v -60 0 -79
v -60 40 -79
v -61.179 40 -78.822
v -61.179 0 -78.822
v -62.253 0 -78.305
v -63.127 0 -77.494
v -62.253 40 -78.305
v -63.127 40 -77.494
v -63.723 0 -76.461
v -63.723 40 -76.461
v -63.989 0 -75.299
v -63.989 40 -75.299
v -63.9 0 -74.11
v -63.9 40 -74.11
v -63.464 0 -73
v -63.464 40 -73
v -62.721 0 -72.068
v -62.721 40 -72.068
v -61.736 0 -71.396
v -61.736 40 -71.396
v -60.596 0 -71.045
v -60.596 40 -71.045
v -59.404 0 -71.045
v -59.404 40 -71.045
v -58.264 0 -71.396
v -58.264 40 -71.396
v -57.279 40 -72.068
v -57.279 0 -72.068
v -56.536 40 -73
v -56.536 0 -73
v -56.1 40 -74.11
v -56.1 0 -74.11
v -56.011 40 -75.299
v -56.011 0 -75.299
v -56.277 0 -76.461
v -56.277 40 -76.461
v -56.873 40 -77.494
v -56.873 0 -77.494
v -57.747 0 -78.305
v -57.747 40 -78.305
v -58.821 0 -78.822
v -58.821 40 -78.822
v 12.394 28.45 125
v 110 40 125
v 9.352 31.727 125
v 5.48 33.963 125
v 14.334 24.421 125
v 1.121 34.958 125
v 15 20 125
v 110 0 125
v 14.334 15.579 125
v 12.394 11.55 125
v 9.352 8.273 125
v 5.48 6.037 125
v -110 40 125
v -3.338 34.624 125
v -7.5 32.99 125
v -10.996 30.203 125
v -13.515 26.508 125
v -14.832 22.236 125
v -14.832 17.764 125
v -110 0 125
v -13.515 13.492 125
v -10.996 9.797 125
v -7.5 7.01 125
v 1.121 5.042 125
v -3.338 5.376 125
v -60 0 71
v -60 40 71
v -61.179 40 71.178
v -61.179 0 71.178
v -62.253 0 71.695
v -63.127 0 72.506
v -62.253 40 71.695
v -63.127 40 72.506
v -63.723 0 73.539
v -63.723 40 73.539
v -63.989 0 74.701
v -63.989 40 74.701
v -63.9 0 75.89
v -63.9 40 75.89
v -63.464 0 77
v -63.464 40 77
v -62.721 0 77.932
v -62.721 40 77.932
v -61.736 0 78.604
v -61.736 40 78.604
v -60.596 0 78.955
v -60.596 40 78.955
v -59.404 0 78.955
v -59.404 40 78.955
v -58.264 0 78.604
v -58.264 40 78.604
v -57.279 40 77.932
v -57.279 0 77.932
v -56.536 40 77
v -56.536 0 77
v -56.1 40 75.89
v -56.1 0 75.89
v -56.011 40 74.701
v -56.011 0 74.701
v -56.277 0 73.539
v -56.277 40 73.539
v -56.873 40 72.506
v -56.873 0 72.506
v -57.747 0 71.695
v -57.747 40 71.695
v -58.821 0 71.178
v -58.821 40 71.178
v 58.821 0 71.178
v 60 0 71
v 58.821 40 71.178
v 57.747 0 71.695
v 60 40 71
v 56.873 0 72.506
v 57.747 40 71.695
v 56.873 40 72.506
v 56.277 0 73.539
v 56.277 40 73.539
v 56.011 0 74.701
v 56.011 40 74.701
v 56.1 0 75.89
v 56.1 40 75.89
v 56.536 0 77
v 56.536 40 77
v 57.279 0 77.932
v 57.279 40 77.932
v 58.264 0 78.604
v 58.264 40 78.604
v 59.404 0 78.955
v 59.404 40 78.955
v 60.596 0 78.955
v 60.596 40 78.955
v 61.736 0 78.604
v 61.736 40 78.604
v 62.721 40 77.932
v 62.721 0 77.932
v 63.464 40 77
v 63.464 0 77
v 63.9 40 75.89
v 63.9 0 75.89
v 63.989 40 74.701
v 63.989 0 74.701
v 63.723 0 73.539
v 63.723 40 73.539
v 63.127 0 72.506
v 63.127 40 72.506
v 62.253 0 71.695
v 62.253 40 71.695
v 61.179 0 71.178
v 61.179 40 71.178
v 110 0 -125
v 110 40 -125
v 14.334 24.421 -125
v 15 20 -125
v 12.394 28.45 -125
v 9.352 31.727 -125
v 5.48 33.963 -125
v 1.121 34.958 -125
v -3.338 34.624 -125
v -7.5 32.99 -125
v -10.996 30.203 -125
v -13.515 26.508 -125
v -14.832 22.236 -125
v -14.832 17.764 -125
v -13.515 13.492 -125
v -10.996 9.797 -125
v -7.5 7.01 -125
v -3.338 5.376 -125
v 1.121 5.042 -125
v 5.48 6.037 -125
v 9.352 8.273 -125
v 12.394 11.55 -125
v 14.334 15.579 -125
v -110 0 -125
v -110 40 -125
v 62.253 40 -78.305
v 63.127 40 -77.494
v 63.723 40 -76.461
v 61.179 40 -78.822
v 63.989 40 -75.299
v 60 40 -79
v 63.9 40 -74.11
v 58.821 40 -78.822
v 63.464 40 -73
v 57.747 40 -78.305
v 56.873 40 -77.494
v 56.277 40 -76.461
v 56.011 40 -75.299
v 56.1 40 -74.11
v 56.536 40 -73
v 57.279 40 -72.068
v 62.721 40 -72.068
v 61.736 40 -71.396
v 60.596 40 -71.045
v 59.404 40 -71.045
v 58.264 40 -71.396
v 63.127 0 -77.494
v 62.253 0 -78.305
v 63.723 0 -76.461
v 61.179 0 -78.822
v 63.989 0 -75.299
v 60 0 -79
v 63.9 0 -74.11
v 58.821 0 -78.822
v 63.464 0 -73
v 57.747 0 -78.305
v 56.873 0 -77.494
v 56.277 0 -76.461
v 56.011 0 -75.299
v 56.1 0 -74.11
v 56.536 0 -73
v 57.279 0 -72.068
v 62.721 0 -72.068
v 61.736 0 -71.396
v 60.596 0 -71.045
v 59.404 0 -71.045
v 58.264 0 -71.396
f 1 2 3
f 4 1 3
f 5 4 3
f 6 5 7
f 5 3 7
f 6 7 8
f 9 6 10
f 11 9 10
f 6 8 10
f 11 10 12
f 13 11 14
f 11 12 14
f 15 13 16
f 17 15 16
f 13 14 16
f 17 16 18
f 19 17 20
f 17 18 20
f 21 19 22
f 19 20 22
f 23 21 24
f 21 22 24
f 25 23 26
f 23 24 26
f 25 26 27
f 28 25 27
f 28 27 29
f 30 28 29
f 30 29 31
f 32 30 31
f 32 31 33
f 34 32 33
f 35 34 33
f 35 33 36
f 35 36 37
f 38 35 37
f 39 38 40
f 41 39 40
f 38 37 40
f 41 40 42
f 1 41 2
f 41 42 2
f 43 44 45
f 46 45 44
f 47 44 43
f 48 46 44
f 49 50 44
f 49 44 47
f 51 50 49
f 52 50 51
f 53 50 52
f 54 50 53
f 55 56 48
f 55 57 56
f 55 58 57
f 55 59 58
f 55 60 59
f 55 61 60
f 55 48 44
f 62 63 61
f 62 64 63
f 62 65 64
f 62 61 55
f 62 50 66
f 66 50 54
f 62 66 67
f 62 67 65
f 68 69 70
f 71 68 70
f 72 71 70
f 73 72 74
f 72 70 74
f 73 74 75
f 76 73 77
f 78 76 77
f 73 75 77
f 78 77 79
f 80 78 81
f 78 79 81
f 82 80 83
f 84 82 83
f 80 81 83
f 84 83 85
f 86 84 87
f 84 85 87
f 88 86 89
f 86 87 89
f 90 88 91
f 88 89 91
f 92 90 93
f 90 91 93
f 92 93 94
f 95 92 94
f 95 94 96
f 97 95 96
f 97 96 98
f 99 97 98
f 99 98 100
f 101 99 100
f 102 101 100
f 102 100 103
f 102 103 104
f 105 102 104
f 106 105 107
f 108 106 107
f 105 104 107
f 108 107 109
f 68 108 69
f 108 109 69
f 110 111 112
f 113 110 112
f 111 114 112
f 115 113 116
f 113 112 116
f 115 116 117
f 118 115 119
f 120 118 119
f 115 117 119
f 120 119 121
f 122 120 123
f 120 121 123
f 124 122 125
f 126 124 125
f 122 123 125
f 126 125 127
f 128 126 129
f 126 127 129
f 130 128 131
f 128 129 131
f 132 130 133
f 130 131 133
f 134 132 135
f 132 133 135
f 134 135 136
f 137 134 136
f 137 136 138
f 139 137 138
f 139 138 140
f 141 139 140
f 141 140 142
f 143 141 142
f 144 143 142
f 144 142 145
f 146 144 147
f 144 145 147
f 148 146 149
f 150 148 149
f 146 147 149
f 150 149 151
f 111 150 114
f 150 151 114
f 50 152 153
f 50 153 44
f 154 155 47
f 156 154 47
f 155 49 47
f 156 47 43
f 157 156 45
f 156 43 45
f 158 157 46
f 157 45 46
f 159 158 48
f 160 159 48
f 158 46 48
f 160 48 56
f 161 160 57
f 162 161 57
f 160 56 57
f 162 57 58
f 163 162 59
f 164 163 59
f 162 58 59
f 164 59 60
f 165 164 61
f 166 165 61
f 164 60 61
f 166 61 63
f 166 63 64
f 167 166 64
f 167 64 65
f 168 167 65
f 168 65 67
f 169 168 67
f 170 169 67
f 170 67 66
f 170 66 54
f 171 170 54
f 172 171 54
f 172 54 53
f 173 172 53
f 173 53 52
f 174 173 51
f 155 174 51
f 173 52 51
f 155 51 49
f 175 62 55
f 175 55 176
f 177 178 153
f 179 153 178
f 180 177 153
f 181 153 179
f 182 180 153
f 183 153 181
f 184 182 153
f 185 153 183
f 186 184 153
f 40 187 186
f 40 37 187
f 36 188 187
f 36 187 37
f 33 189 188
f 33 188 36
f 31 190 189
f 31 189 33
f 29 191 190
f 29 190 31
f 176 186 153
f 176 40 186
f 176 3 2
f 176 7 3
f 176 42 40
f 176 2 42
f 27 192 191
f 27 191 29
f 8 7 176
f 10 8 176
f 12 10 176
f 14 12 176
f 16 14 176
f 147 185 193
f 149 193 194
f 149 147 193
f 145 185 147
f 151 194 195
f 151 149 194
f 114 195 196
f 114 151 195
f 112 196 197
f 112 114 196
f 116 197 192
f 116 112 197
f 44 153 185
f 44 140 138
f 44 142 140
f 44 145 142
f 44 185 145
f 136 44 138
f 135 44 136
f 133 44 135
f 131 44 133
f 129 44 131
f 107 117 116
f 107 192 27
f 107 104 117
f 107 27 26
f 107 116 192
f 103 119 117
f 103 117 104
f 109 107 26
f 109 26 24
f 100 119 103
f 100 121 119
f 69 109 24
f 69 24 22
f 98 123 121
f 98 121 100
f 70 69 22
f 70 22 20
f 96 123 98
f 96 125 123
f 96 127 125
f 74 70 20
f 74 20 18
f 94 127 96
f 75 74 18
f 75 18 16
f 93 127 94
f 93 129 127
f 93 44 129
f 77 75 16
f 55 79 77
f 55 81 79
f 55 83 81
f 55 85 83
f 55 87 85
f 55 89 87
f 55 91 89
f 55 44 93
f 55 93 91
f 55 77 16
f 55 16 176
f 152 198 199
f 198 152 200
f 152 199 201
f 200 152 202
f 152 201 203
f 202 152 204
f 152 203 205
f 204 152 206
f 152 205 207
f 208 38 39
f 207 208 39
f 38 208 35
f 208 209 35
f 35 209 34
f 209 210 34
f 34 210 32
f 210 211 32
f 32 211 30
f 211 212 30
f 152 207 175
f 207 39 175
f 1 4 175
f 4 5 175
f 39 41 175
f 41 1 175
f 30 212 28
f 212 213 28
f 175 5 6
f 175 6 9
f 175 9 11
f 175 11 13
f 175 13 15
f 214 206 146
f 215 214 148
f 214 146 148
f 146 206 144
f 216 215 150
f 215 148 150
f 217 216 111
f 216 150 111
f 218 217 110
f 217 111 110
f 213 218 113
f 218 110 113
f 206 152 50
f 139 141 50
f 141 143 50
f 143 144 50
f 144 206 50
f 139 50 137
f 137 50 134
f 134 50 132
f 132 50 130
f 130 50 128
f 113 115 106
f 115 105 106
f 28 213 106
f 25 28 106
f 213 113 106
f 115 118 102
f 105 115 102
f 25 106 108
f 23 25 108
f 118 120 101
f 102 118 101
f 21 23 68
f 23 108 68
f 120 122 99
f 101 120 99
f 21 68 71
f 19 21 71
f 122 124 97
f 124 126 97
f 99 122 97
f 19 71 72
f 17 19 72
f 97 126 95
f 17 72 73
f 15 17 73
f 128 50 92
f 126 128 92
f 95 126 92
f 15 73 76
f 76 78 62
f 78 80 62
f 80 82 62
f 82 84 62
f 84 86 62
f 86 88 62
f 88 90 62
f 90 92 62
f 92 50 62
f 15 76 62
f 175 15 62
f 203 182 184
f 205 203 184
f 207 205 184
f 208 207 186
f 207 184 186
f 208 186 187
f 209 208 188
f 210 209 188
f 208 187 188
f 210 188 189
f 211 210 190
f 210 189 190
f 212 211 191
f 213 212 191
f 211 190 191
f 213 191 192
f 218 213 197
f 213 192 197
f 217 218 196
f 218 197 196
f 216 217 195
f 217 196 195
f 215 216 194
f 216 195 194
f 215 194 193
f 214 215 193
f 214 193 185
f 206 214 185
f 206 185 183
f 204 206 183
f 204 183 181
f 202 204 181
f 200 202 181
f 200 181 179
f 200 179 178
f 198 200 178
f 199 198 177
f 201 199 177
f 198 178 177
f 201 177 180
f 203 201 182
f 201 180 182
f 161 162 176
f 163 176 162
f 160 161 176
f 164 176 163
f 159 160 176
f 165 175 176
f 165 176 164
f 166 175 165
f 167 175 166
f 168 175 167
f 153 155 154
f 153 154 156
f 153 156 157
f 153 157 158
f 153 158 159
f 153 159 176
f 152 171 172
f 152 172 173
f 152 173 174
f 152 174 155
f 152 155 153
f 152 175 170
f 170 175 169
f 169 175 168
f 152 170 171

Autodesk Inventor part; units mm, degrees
ref_plane "YZ Plane" through (0, 0, 0) normal (1, 0, 0) x (0, 1, 0)
ref_plane "XZ Plane" through (0, 0, 0) normal (0, 1, 0) x (-1, 0, 0)
ref_plane "XY Plane" through (0, 0, 0) normal (0, 0, 1) x (1, 0, 0)
sketch "Sketch1" plane through (0, 0, 0) normal (0, 1, 0) x (-1, 0, 0)
  line L0 (110, -125) -> (-110, -125)
  line L1 (-110, -125) -> (-110, 125)
  line L2 (-110, 125) -> (110, 125)
  line L3 (110, 125) -> (110, -125)
  line L4 (110, -125) -> (-110, 125) construction
  line L5 (-110, -125) -> (110, 125) construction
  line L6 (-60, 75) -> (60, 75) construction
  line L7 (60, 75) -> (60, -75) construction
  line L8 (60, -75) -> (-60, -75) construction
  line L9 (-60, -75) -> (-60, 75) construction
  line L10 (-60, 75) -> (60, -75) construction
  line L11 (60, 75) -> (-60, -75) construction
  point P0 (0, 0)
  dimension "d0" = 220
  dimension "d1" = 250
  dimension "d2" = 120
  dimension "d3" = 150
extrude "Extrusion1" add sketch "Sketch1" along normal blind 40
hole "Hole1" at (-60, 0, -75) at (60, 0, -75) at (60, 0, 75) at (-60, 0, 75) direction (0, 1, 0) diameter 8 end through all
sketch "Sketch2" plane through (-110, 0, 125) normal (0, 0, 1) x (1, 0, 0)
  line L0 (0, 0) -> (220, 0) construction
  line L1 (0, 40) -> (220, 40) construction
  line L2 (220, 0) -> (0, 40) construction
  line L3 (0, 0) -> (220, 40) construction
  circle A0 centre (110, 20) radius 15
  point P0 (110, 0)
  dimension "d13" = 30
extrude "Extrusion2" cut sketch "Sketch2" against normal through all
properties part number "SACMI DPA TILES GRIP FIXED SUPPORT"
